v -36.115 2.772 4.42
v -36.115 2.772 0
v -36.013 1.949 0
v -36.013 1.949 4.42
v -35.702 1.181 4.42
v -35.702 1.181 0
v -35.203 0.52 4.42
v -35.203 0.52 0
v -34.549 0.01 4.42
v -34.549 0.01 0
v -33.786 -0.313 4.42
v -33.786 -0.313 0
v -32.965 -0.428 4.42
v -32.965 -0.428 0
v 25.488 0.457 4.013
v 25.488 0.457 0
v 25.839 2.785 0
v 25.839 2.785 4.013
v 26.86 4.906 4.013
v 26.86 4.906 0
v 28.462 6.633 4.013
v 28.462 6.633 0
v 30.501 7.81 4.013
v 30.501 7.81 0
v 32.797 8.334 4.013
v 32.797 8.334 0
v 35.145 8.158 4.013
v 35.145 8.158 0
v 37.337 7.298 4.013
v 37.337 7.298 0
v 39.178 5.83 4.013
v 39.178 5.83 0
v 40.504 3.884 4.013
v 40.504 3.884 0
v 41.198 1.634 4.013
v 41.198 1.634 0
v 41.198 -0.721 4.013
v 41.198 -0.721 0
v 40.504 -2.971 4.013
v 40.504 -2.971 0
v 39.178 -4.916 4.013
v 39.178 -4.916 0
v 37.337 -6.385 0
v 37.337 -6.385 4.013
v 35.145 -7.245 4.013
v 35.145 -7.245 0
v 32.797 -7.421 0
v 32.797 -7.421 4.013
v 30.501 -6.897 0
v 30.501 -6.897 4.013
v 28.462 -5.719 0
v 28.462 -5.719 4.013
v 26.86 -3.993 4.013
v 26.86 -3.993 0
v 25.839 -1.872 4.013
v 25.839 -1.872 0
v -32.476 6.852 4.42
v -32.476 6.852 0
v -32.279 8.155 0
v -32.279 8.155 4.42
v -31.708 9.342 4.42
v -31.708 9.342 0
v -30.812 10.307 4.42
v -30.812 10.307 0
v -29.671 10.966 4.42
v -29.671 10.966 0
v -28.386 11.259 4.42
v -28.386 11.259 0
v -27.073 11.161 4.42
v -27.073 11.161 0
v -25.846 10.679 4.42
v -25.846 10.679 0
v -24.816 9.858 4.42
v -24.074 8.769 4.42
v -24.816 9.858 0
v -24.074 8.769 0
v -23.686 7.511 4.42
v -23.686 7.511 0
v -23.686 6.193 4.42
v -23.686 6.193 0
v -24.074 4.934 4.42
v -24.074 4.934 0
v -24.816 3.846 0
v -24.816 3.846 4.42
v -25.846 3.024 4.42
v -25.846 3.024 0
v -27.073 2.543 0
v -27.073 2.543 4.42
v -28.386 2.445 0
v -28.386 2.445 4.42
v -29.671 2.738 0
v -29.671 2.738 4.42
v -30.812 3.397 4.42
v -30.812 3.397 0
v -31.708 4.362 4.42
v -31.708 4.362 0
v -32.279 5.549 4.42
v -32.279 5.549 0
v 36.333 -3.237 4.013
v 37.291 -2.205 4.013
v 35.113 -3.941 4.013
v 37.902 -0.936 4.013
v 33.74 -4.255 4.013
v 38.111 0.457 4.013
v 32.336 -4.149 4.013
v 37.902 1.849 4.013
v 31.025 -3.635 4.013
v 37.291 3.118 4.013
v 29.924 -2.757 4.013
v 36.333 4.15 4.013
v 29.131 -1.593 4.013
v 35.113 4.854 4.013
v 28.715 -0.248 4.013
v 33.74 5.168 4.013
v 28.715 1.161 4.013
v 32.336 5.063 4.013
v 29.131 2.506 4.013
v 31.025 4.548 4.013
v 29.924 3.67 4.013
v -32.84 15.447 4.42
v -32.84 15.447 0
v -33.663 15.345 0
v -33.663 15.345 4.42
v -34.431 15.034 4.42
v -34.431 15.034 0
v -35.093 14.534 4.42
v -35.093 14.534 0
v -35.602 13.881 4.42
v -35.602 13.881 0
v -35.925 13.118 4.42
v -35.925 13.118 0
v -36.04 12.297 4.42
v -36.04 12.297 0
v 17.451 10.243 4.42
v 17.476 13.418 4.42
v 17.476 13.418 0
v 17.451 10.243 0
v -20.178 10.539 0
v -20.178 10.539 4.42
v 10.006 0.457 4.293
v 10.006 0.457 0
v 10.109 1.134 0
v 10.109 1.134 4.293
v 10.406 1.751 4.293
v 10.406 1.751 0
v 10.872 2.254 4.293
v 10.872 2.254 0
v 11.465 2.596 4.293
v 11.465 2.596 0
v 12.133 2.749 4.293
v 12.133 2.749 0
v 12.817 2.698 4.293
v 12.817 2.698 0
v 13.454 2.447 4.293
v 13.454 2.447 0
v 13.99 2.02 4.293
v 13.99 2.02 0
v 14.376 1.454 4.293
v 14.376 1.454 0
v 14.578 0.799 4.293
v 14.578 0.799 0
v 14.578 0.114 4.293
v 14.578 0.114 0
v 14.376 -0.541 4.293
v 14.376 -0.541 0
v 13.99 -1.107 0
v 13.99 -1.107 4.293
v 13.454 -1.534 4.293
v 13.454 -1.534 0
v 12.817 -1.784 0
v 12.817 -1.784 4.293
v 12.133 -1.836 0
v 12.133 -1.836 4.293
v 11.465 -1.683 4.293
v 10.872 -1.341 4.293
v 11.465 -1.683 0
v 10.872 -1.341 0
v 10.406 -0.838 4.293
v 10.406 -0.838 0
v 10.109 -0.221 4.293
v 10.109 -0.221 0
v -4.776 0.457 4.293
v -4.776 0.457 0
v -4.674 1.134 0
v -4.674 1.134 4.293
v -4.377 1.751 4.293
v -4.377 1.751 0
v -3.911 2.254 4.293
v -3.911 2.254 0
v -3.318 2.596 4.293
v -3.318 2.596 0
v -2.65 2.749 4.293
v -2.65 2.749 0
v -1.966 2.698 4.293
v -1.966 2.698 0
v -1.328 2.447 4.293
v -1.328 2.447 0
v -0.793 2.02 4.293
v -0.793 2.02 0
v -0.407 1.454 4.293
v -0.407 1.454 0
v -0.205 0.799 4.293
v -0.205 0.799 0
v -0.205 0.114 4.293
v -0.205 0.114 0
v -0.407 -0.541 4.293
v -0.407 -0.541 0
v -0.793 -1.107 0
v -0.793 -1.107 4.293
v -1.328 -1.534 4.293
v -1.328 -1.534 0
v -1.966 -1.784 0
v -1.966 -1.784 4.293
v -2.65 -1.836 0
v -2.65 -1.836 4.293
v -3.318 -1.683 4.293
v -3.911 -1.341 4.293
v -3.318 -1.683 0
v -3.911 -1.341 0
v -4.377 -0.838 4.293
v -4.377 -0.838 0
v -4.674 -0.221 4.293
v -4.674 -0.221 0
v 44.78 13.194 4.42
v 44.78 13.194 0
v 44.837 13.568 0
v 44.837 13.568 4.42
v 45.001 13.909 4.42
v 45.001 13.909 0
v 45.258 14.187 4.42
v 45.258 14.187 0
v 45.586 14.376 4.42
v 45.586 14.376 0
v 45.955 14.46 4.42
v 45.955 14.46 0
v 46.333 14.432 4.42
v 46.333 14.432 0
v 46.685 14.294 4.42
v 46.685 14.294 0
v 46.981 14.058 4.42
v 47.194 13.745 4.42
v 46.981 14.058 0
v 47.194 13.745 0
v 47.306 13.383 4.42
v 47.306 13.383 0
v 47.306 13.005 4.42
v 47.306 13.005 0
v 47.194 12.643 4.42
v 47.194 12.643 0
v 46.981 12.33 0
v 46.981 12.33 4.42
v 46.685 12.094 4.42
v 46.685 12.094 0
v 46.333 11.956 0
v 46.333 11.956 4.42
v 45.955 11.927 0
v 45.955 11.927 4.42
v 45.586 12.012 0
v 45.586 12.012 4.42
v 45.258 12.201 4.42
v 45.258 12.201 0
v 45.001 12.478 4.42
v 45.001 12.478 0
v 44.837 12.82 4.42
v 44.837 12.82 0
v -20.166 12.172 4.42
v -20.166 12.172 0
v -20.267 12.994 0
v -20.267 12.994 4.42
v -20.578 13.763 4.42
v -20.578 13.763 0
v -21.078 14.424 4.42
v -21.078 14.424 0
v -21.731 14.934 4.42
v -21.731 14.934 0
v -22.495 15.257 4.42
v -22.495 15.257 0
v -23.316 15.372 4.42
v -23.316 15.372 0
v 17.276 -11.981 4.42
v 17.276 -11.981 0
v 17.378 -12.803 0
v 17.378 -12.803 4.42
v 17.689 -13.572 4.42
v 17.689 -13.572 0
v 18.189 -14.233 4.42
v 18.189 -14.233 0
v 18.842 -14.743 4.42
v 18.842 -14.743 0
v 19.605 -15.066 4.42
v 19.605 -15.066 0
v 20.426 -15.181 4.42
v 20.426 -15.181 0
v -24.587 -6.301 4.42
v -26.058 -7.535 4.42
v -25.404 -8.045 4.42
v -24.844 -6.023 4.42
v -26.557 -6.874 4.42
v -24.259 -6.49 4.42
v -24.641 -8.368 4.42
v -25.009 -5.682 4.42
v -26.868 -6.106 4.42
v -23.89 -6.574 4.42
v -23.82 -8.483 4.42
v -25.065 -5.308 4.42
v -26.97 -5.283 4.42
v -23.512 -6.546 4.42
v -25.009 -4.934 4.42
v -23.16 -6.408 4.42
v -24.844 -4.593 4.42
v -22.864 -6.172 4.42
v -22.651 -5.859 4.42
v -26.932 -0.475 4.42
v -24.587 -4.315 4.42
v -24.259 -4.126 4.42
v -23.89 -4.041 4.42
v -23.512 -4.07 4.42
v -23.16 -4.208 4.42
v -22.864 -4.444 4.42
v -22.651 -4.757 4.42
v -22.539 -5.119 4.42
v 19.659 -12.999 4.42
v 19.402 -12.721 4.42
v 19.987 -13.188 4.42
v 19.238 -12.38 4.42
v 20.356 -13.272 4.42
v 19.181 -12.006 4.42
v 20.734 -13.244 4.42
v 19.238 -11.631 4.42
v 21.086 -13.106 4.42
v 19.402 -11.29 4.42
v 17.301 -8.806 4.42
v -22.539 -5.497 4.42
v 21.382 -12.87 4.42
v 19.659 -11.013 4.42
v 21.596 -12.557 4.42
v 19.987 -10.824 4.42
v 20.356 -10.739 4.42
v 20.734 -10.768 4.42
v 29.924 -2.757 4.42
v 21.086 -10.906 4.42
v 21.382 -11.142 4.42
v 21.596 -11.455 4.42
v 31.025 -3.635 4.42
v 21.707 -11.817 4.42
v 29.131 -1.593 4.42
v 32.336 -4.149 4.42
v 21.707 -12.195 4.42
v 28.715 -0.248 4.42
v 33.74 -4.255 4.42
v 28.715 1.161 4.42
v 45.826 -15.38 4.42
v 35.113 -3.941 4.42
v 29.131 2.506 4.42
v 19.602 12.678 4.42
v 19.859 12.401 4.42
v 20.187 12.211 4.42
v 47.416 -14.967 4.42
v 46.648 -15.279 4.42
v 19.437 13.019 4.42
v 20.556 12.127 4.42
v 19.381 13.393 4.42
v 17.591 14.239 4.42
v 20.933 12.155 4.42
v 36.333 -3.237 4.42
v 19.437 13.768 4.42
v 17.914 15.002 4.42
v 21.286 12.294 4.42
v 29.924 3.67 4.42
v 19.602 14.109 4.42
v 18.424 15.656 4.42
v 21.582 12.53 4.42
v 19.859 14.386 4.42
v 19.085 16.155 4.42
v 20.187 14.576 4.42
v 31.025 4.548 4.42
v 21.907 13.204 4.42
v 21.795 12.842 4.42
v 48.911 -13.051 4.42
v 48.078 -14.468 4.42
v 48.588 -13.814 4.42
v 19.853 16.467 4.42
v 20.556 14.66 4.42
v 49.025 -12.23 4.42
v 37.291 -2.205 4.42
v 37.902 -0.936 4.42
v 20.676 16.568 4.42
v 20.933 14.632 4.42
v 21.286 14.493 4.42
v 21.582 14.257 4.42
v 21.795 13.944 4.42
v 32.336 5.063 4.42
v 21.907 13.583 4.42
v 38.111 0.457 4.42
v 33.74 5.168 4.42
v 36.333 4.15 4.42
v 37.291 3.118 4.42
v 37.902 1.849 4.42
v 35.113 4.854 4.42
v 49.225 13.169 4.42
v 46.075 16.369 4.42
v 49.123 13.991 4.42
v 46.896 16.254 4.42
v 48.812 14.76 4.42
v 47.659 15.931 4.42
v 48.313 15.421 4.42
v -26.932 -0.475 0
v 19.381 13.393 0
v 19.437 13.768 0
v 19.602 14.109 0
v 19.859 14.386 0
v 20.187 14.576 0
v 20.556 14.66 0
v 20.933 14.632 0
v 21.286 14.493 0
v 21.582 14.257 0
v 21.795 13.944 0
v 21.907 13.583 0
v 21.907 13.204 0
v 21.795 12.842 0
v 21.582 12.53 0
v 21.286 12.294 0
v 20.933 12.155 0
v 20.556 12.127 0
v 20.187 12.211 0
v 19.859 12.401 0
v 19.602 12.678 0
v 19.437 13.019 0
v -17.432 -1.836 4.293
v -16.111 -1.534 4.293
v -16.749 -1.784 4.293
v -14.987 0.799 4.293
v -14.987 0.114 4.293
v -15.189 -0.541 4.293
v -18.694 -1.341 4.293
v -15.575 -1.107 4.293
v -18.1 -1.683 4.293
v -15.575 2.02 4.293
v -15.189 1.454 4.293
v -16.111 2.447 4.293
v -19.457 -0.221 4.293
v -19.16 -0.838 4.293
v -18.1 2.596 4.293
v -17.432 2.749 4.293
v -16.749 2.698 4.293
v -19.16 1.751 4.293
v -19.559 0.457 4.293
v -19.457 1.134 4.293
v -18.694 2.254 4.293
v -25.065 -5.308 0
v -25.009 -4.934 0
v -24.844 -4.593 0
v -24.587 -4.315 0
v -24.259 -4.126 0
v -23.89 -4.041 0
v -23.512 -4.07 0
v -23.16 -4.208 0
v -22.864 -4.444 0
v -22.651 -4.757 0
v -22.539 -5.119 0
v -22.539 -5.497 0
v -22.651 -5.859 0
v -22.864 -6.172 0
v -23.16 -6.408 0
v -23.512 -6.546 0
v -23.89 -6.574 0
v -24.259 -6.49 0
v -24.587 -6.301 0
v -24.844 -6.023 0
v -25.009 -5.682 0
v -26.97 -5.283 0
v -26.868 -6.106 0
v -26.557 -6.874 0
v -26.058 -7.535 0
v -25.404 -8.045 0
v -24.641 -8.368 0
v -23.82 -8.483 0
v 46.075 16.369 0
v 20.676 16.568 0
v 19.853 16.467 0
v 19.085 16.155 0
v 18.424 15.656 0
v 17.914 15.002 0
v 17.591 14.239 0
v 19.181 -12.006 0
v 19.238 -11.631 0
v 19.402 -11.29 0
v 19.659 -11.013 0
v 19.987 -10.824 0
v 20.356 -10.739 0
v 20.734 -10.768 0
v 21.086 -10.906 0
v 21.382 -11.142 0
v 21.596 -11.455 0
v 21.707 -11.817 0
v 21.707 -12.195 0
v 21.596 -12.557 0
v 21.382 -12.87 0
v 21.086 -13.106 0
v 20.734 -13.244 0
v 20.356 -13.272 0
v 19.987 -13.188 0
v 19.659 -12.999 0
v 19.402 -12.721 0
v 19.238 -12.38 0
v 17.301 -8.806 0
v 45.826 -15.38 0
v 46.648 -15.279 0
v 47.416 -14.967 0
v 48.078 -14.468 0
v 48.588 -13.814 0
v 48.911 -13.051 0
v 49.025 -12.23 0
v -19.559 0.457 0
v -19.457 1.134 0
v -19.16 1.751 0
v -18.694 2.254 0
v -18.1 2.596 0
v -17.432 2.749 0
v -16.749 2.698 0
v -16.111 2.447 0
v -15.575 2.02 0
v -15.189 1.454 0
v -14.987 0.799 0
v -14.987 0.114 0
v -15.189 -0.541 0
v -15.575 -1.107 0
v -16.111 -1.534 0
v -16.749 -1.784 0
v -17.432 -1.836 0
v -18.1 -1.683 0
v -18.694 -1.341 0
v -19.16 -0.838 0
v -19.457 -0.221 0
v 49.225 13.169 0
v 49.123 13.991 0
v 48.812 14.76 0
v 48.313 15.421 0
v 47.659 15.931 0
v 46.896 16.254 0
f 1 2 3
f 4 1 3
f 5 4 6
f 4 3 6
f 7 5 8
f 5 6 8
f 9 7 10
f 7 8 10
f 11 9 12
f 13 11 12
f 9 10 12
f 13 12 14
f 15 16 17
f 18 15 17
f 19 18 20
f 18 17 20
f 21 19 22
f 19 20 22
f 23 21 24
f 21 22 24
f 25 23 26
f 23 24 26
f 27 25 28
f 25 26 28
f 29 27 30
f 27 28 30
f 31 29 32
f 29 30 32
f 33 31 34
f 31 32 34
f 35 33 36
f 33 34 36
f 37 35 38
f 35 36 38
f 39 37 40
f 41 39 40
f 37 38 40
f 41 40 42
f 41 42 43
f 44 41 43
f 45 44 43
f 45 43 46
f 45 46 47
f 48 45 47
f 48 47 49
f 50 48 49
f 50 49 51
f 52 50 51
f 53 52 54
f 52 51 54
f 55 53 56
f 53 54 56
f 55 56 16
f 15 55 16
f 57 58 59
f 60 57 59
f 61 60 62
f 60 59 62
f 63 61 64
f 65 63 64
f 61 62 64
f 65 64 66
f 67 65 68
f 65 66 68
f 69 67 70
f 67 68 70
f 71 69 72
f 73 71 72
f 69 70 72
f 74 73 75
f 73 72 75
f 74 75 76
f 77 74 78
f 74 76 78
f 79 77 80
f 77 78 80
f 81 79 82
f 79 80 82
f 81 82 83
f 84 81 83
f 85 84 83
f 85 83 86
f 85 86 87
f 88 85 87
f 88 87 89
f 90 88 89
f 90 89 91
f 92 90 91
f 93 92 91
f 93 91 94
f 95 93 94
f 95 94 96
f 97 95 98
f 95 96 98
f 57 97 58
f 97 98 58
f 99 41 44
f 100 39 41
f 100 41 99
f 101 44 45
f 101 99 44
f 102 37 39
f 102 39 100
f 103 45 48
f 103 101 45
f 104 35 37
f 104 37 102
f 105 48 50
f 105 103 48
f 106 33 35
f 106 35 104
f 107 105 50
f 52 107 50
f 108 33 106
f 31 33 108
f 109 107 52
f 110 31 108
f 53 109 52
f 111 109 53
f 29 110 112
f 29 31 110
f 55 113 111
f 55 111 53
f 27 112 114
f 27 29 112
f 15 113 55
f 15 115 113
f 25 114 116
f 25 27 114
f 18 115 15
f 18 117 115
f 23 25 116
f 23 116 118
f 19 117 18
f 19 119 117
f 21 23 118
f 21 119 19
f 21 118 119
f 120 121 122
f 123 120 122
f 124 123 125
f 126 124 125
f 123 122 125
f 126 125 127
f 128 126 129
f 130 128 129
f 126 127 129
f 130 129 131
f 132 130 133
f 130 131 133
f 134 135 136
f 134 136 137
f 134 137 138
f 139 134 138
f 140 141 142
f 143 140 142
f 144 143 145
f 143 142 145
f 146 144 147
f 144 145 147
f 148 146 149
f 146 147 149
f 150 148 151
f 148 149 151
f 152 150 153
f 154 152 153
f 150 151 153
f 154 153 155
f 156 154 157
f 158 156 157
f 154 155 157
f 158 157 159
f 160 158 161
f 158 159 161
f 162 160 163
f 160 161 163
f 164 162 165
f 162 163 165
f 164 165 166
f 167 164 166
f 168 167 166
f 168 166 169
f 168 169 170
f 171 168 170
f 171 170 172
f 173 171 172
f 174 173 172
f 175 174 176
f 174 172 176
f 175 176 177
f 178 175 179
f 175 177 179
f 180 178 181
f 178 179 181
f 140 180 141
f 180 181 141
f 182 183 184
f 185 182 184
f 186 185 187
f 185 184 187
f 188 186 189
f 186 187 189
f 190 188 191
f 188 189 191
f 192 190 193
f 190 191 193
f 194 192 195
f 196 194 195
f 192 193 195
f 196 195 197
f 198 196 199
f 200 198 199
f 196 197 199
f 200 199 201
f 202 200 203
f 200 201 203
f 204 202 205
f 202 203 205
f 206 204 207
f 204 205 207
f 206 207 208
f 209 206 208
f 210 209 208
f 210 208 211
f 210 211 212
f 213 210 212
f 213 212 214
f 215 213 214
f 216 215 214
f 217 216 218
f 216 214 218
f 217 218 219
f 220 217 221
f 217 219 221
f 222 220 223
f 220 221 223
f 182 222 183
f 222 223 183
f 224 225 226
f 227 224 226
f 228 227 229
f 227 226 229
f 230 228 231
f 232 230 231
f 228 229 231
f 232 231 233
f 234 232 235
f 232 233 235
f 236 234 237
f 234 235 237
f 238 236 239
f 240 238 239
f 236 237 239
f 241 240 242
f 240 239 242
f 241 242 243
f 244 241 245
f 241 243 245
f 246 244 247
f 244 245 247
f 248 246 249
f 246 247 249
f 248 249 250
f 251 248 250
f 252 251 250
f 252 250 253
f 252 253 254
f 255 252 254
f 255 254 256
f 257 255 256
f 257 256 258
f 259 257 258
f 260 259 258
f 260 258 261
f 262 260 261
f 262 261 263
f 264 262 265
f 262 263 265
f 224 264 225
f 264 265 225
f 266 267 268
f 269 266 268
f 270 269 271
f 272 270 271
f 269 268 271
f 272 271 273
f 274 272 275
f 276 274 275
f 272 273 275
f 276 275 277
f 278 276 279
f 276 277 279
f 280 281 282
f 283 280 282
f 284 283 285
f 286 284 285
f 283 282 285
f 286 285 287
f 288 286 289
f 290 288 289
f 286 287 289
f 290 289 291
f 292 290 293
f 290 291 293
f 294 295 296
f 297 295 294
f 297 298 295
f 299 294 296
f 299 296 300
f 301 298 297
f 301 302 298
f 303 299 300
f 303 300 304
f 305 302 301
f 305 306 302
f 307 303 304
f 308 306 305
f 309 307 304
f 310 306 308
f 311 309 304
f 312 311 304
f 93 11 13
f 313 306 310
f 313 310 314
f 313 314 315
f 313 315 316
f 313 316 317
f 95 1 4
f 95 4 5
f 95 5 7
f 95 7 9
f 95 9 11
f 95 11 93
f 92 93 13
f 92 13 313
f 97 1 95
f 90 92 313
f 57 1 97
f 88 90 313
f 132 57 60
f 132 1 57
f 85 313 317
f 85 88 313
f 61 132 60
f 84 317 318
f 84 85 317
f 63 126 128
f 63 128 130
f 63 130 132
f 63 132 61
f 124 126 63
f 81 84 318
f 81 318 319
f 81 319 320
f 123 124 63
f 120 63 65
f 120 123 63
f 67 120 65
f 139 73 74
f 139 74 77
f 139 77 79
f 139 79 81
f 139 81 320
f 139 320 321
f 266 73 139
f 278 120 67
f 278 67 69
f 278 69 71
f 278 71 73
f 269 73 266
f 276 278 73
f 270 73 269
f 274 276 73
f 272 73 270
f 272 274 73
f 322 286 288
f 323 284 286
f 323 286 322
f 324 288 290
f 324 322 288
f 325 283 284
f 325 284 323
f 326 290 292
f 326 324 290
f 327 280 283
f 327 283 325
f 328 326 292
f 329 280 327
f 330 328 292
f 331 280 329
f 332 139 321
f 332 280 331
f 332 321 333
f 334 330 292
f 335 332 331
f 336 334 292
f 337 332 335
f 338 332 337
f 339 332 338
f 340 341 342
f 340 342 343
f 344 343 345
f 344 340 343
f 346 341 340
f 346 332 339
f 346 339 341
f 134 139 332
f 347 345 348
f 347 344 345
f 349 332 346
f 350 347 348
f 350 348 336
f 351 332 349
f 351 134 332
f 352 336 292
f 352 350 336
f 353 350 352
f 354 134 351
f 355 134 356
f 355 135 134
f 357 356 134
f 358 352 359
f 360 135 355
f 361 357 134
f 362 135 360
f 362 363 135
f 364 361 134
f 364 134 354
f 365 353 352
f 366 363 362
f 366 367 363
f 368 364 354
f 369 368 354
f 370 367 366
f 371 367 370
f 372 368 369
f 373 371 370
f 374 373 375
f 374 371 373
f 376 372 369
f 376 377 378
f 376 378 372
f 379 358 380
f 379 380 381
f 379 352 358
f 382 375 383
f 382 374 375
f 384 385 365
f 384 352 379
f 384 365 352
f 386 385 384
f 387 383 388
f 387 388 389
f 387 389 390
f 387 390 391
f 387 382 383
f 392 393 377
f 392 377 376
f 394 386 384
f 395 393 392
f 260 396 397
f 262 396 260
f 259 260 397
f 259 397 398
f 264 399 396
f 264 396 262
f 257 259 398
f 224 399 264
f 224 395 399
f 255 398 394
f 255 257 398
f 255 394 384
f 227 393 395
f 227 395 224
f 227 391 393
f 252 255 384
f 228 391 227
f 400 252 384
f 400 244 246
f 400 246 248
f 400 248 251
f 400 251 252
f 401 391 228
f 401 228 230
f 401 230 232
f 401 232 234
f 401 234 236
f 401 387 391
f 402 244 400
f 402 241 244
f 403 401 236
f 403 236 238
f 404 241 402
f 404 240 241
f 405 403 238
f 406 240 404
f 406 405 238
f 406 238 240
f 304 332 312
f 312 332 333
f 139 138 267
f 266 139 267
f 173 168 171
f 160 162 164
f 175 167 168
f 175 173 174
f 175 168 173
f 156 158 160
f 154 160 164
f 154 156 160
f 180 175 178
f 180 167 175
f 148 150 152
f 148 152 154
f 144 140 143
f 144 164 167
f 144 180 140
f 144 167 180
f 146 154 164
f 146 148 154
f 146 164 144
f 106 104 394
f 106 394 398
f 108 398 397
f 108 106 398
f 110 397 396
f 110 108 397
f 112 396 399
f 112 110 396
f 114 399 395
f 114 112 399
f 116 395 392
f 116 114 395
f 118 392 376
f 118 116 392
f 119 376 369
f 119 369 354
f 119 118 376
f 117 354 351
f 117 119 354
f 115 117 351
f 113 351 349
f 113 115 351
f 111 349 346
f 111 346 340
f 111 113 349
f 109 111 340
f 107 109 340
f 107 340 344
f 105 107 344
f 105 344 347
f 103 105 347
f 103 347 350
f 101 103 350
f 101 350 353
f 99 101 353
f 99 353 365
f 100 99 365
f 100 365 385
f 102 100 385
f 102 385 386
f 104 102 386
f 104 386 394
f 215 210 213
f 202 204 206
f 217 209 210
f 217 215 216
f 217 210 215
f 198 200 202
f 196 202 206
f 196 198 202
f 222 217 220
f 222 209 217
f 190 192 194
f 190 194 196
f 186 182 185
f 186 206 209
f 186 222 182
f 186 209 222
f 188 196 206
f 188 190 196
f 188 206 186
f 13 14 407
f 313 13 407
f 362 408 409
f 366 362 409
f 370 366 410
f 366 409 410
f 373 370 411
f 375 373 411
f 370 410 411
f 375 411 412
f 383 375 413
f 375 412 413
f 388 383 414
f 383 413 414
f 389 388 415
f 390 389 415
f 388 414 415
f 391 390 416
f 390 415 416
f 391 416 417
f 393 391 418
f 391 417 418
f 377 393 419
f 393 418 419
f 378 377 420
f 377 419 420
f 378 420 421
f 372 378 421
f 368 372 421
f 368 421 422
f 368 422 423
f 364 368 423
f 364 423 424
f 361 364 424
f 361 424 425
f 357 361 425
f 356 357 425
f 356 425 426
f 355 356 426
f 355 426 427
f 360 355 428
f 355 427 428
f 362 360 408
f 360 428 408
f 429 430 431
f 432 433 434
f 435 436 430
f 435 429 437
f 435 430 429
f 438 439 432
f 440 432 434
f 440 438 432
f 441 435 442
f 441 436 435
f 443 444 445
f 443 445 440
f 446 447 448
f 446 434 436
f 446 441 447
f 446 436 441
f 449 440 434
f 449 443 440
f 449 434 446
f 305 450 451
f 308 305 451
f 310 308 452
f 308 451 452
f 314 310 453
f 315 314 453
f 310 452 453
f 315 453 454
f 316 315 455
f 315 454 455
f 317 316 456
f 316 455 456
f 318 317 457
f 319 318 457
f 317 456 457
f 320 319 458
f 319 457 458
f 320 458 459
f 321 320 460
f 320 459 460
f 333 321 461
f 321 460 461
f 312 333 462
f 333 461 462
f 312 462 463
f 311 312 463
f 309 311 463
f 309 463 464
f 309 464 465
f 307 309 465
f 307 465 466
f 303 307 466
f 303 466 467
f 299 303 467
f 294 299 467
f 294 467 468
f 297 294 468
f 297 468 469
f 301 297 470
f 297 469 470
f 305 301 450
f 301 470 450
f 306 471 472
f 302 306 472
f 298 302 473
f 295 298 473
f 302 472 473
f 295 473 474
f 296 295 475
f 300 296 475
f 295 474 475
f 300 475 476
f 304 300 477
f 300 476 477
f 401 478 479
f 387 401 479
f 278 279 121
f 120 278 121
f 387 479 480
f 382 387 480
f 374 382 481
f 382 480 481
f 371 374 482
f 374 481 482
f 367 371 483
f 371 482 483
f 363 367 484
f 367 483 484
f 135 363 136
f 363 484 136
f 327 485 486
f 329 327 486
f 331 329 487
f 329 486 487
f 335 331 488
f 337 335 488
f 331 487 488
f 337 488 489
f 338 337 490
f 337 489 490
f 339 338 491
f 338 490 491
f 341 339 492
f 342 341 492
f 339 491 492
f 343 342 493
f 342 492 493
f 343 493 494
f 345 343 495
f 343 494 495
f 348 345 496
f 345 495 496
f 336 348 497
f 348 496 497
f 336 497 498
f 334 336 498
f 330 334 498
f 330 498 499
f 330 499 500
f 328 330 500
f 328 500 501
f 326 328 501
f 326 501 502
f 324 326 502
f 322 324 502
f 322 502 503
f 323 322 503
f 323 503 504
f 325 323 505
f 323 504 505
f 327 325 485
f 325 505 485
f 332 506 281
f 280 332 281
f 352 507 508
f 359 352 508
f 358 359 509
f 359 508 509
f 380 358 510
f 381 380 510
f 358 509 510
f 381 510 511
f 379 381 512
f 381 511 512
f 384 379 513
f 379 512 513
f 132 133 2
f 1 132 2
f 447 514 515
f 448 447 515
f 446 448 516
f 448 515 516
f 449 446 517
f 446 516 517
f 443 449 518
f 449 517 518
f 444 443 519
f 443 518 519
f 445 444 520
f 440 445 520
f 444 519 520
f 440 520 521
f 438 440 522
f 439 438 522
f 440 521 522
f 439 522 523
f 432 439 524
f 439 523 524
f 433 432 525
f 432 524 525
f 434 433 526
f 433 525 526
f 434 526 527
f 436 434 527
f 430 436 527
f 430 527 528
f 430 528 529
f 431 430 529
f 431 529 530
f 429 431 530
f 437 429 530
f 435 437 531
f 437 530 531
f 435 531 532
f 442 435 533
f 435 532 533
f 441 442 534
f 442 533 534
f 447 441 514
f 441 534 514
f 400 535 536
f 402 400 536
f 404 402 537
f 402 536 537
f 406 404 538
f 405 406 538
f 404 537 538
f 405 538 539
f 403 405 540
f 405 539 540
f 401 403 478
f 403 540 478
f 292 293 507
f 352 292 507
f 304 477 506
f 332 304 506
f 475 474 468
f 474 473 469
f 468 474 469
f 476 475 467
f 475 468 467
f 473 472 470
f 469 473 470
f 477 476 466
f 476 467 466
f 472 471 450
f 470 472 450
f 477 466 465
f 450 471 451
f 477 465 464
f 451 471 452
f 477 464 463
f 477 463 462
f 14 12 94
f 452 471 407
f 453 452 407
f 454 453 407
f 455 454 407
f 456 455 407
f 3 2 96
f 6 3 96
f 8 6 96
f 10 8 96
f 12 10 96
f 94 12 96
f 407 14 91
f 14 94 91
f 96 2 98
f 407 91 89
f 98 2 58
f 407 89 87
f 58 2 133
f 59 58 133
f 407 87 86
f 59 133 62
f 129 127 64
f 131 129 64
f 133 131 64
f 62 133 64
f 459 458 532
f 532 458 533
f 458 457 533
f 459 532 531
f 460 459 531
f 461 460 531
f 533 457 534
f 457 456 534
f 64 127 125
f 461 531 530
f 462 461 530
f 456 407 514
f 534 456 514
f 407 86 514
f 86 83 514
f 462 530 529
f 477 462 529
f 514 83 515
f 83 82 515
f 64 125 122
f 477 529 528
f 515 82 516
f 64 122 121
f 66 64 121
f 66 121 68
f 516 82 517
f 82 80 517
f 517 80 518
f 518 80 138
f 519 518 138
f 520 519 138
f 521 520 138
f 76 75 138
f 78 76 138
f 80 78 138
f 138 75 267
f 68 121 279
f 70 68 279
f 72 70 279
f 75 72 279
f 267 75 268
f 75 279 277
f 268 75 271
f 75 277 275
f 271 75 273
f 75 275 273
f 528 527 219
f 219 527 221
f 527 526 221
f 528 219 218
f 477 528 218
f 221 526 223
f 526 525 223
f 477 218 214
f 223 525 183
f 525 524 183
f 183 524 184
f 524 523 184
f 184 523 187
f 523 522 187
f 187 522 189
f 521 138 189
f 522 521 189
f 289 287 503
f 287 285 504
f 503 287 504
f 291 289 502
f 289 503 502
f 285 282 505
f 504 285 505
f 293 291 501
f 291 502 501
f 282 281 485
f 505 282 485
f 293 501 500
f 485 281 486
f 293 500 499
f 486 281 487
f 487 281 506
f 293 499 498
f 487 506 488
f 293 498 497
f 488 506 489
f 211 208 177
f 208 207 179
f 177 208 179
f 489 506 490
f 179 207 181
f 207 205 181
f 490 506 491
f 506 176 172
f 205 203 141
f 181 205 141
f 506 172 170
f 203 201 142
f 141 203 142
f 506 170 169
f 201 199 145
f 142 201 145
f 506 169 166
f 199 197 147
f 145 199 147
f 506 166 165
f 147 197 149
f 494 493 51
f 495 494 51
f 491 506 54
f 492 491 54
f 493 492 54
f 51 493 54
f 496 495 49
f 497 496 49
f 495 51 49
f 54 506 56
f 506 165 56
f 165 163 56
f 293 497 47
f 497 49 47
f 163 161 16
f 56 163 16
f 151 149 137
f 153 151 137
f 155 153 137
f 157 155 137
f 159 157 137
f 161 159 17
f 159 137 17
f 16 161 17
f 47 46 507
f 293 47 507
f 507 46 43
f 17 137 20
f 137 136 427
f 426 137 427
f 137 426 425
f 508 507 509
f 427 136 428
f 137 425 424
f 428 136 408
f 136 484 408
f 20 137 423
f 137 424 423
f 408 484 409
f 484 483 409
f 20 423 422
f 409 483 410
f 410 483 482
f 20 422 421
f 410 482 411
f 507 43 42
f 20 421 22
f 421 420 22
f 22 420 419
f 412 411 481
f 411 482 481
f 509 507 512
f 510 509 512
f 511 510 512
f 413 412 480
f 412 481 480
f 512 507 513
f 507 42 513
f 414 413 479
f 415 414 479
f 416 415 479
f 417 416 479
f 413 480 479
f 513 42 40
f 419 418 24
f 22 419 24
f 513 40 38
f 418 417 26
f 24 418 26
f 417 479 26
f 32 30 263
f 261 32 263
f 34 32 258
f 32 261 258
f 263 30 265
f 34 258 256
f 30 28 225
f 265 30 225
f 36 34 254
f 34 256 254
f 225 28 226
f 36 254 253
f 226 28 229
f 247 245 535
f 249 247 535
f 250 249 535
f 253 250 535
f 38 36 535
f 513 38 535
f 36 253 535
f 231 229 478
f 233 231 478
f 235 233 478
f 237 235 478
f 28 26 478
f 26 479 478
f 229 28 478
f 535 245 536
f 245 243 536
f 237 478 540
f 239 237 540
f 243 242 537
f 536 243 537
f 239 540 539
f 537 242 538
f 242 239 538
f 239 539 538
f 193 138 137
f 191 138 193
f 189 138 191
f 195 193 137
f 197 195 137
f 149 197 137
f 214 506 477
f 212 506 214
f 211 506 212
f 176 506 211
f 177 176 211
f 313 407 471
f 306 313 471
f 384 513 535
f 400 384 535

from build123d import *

# Parameters (mm, degrees)
SKETCH4_R                = 4.7244
STOCK_DEPTH              = 4.4196
SKETCH7_R                = 7.8994
CV_GEAR_WELL_DEPTH       = 4.0132
SKETCH8_R                = 2.2987
IDLER_GEAR_WELL_DEPTH    = 4.2926
SKETCH9_R                = 4.4196
SKETCH9_R_2              = 1.27
OUTDRIVE_GEAR_WELL_DEPTH = 4.4196


with BuildPart() as part:
    # Sketch4 → Stock (new body)
    with BuildSketch(Plane.XY):
        with BuildLine():
            Line((17.301339891, -8.805936455), (17.27639382, -11.980838452))
            ThreePointArc((17.27639382, -11.980838452), (18.188661549, -14.233139719), (20.426349746, -15.180686521))
            Line((20.426349746, -15.180686521), (45.825565725, -15.380255093))
            ThreePointArc((45.825565725, -15.380255093), (48.077866993, -14.467987364), (49.025413794, -12.230299167))
            Line((49.025413794, -12.230299167), (49.224982366, 13.168916813))
            ThreePointArc((49.224982366, 13.168916813), (48.312714637, 15.42121808), (46.07502644, 16.368764882))
            Line((46.07502644, 16.368764882), (20.675810461, 16.568333454))
            ThreePointArc((20.675810461, 16.568333454), (18.423509193, 15.656065724), (17.475962392, 13.418377528))
            Line((17.475962392, 13.418377528), (17.45101632, 10.24347553))
            Line((17.45101632, 10.24347553), (-20.178385282, 10.539140008))
            Line((-20.178385282, 10.539140008), (-20.16555609, 12.171919255))
            ThreePointArc((-20.16555609, 12.171919255), (-21.077823819, 14.424220522), (-23.315512016, 15.371767324))
            Line((-23.315512016, 15.371767324), (-32.840218009, 15.446605538))
            ThreePointArc((-32.840218009, 15.446605538), (-35.092519276, 14.534337809), (-36.040066078, 12.296649612))
            Line((-36.040066078, 12.296649612), (-36.114904292, 2.77194362))
            ThreePointArc((-36.114904292, 2.77194362), (-35.202636563, 0.519642353), (-32.964948366, -0.427904449))
            Line((-32.964948366, -0.427904449), (-26.932171442, -0.475305624))
            Line((-26.932171442, -0.475305624), (-26.969946706, -5.282986868))
            ThreePointArc((-26.969946706, -5.282986868), (-26.057678977, -7.535288135), (-23.81999078, -8.482834937))
            Line((-23.81999078, -8.482834937), (17.301339891, -8.805936455))
        make_face()
        with Locations((33.387081626, 0.456569756)):
            Circle(SKETCH4_R, mode=Mode.SUBTRACT)
    extrude(amount=STOCK_DEPTH)

    # Sketch7 → CV Gear Well (cut)
    with BuildSketch(Plane(origin=(0, 0, 0), x_dir=(-1, 0, 0), z_dir=(0, 0, -1))):
        with Locations((-33.387081626, 0.456569756)):
            Circle(SKETCH7_R)
    extrude(amount=-CV_GEAR_WELL_DEPTH, mode=Mode.SUBTRACT)

    # Sketch8 → Idler Gear Well (cut)
    with BuildSketch(Plane(origin=(0, 0, 0), x_dir=(-1, 0, 0), z_dir=(0, 0, -1))):
        with Locations((-12.305081626, 0.456569756)):
            Circle(SKETCH8_R)
        with Locations((2.477718374, 0.456569756)):
            Circle(SKETCH8_R)
        with Locations((17.260518374, 0.456569756)):
            Circle(SKETCH8_R)
    extrude(amount=-IDLER_GEAR_WELL_DEPTH, mode=Mode.SUBTRACT)

    # Sketch9 → Outdrive Gear Well (cut)
    with BuildSketch(Plane(origin=(0, 0, 0), x_dir=(-1, 0, 0), z_dir=(0, 0, -1))):
        with Locations((28.055981517, 6.851899403)):
            Circle(SKETCH9_R)
        with Locations((-46.050080369, 13.193862884)):
            Circle(SKETCH9_R_2)
        with Locations((-20.650864389, 13.393431456)):
            Circle(SKETCH9_R_2)
        with Locations((-20.451295817, -12.005784524)):
            Circle(SKETCH9_R_2)
        with Locations((23.795044709, -5.307932939)):
            Circle(SKETCH9_R_2)
    extrude(amount=-OUTDRIVE_GEAR_WELL_DEPTH, mode=Mode.SUBTRACT)


solid = part.part
